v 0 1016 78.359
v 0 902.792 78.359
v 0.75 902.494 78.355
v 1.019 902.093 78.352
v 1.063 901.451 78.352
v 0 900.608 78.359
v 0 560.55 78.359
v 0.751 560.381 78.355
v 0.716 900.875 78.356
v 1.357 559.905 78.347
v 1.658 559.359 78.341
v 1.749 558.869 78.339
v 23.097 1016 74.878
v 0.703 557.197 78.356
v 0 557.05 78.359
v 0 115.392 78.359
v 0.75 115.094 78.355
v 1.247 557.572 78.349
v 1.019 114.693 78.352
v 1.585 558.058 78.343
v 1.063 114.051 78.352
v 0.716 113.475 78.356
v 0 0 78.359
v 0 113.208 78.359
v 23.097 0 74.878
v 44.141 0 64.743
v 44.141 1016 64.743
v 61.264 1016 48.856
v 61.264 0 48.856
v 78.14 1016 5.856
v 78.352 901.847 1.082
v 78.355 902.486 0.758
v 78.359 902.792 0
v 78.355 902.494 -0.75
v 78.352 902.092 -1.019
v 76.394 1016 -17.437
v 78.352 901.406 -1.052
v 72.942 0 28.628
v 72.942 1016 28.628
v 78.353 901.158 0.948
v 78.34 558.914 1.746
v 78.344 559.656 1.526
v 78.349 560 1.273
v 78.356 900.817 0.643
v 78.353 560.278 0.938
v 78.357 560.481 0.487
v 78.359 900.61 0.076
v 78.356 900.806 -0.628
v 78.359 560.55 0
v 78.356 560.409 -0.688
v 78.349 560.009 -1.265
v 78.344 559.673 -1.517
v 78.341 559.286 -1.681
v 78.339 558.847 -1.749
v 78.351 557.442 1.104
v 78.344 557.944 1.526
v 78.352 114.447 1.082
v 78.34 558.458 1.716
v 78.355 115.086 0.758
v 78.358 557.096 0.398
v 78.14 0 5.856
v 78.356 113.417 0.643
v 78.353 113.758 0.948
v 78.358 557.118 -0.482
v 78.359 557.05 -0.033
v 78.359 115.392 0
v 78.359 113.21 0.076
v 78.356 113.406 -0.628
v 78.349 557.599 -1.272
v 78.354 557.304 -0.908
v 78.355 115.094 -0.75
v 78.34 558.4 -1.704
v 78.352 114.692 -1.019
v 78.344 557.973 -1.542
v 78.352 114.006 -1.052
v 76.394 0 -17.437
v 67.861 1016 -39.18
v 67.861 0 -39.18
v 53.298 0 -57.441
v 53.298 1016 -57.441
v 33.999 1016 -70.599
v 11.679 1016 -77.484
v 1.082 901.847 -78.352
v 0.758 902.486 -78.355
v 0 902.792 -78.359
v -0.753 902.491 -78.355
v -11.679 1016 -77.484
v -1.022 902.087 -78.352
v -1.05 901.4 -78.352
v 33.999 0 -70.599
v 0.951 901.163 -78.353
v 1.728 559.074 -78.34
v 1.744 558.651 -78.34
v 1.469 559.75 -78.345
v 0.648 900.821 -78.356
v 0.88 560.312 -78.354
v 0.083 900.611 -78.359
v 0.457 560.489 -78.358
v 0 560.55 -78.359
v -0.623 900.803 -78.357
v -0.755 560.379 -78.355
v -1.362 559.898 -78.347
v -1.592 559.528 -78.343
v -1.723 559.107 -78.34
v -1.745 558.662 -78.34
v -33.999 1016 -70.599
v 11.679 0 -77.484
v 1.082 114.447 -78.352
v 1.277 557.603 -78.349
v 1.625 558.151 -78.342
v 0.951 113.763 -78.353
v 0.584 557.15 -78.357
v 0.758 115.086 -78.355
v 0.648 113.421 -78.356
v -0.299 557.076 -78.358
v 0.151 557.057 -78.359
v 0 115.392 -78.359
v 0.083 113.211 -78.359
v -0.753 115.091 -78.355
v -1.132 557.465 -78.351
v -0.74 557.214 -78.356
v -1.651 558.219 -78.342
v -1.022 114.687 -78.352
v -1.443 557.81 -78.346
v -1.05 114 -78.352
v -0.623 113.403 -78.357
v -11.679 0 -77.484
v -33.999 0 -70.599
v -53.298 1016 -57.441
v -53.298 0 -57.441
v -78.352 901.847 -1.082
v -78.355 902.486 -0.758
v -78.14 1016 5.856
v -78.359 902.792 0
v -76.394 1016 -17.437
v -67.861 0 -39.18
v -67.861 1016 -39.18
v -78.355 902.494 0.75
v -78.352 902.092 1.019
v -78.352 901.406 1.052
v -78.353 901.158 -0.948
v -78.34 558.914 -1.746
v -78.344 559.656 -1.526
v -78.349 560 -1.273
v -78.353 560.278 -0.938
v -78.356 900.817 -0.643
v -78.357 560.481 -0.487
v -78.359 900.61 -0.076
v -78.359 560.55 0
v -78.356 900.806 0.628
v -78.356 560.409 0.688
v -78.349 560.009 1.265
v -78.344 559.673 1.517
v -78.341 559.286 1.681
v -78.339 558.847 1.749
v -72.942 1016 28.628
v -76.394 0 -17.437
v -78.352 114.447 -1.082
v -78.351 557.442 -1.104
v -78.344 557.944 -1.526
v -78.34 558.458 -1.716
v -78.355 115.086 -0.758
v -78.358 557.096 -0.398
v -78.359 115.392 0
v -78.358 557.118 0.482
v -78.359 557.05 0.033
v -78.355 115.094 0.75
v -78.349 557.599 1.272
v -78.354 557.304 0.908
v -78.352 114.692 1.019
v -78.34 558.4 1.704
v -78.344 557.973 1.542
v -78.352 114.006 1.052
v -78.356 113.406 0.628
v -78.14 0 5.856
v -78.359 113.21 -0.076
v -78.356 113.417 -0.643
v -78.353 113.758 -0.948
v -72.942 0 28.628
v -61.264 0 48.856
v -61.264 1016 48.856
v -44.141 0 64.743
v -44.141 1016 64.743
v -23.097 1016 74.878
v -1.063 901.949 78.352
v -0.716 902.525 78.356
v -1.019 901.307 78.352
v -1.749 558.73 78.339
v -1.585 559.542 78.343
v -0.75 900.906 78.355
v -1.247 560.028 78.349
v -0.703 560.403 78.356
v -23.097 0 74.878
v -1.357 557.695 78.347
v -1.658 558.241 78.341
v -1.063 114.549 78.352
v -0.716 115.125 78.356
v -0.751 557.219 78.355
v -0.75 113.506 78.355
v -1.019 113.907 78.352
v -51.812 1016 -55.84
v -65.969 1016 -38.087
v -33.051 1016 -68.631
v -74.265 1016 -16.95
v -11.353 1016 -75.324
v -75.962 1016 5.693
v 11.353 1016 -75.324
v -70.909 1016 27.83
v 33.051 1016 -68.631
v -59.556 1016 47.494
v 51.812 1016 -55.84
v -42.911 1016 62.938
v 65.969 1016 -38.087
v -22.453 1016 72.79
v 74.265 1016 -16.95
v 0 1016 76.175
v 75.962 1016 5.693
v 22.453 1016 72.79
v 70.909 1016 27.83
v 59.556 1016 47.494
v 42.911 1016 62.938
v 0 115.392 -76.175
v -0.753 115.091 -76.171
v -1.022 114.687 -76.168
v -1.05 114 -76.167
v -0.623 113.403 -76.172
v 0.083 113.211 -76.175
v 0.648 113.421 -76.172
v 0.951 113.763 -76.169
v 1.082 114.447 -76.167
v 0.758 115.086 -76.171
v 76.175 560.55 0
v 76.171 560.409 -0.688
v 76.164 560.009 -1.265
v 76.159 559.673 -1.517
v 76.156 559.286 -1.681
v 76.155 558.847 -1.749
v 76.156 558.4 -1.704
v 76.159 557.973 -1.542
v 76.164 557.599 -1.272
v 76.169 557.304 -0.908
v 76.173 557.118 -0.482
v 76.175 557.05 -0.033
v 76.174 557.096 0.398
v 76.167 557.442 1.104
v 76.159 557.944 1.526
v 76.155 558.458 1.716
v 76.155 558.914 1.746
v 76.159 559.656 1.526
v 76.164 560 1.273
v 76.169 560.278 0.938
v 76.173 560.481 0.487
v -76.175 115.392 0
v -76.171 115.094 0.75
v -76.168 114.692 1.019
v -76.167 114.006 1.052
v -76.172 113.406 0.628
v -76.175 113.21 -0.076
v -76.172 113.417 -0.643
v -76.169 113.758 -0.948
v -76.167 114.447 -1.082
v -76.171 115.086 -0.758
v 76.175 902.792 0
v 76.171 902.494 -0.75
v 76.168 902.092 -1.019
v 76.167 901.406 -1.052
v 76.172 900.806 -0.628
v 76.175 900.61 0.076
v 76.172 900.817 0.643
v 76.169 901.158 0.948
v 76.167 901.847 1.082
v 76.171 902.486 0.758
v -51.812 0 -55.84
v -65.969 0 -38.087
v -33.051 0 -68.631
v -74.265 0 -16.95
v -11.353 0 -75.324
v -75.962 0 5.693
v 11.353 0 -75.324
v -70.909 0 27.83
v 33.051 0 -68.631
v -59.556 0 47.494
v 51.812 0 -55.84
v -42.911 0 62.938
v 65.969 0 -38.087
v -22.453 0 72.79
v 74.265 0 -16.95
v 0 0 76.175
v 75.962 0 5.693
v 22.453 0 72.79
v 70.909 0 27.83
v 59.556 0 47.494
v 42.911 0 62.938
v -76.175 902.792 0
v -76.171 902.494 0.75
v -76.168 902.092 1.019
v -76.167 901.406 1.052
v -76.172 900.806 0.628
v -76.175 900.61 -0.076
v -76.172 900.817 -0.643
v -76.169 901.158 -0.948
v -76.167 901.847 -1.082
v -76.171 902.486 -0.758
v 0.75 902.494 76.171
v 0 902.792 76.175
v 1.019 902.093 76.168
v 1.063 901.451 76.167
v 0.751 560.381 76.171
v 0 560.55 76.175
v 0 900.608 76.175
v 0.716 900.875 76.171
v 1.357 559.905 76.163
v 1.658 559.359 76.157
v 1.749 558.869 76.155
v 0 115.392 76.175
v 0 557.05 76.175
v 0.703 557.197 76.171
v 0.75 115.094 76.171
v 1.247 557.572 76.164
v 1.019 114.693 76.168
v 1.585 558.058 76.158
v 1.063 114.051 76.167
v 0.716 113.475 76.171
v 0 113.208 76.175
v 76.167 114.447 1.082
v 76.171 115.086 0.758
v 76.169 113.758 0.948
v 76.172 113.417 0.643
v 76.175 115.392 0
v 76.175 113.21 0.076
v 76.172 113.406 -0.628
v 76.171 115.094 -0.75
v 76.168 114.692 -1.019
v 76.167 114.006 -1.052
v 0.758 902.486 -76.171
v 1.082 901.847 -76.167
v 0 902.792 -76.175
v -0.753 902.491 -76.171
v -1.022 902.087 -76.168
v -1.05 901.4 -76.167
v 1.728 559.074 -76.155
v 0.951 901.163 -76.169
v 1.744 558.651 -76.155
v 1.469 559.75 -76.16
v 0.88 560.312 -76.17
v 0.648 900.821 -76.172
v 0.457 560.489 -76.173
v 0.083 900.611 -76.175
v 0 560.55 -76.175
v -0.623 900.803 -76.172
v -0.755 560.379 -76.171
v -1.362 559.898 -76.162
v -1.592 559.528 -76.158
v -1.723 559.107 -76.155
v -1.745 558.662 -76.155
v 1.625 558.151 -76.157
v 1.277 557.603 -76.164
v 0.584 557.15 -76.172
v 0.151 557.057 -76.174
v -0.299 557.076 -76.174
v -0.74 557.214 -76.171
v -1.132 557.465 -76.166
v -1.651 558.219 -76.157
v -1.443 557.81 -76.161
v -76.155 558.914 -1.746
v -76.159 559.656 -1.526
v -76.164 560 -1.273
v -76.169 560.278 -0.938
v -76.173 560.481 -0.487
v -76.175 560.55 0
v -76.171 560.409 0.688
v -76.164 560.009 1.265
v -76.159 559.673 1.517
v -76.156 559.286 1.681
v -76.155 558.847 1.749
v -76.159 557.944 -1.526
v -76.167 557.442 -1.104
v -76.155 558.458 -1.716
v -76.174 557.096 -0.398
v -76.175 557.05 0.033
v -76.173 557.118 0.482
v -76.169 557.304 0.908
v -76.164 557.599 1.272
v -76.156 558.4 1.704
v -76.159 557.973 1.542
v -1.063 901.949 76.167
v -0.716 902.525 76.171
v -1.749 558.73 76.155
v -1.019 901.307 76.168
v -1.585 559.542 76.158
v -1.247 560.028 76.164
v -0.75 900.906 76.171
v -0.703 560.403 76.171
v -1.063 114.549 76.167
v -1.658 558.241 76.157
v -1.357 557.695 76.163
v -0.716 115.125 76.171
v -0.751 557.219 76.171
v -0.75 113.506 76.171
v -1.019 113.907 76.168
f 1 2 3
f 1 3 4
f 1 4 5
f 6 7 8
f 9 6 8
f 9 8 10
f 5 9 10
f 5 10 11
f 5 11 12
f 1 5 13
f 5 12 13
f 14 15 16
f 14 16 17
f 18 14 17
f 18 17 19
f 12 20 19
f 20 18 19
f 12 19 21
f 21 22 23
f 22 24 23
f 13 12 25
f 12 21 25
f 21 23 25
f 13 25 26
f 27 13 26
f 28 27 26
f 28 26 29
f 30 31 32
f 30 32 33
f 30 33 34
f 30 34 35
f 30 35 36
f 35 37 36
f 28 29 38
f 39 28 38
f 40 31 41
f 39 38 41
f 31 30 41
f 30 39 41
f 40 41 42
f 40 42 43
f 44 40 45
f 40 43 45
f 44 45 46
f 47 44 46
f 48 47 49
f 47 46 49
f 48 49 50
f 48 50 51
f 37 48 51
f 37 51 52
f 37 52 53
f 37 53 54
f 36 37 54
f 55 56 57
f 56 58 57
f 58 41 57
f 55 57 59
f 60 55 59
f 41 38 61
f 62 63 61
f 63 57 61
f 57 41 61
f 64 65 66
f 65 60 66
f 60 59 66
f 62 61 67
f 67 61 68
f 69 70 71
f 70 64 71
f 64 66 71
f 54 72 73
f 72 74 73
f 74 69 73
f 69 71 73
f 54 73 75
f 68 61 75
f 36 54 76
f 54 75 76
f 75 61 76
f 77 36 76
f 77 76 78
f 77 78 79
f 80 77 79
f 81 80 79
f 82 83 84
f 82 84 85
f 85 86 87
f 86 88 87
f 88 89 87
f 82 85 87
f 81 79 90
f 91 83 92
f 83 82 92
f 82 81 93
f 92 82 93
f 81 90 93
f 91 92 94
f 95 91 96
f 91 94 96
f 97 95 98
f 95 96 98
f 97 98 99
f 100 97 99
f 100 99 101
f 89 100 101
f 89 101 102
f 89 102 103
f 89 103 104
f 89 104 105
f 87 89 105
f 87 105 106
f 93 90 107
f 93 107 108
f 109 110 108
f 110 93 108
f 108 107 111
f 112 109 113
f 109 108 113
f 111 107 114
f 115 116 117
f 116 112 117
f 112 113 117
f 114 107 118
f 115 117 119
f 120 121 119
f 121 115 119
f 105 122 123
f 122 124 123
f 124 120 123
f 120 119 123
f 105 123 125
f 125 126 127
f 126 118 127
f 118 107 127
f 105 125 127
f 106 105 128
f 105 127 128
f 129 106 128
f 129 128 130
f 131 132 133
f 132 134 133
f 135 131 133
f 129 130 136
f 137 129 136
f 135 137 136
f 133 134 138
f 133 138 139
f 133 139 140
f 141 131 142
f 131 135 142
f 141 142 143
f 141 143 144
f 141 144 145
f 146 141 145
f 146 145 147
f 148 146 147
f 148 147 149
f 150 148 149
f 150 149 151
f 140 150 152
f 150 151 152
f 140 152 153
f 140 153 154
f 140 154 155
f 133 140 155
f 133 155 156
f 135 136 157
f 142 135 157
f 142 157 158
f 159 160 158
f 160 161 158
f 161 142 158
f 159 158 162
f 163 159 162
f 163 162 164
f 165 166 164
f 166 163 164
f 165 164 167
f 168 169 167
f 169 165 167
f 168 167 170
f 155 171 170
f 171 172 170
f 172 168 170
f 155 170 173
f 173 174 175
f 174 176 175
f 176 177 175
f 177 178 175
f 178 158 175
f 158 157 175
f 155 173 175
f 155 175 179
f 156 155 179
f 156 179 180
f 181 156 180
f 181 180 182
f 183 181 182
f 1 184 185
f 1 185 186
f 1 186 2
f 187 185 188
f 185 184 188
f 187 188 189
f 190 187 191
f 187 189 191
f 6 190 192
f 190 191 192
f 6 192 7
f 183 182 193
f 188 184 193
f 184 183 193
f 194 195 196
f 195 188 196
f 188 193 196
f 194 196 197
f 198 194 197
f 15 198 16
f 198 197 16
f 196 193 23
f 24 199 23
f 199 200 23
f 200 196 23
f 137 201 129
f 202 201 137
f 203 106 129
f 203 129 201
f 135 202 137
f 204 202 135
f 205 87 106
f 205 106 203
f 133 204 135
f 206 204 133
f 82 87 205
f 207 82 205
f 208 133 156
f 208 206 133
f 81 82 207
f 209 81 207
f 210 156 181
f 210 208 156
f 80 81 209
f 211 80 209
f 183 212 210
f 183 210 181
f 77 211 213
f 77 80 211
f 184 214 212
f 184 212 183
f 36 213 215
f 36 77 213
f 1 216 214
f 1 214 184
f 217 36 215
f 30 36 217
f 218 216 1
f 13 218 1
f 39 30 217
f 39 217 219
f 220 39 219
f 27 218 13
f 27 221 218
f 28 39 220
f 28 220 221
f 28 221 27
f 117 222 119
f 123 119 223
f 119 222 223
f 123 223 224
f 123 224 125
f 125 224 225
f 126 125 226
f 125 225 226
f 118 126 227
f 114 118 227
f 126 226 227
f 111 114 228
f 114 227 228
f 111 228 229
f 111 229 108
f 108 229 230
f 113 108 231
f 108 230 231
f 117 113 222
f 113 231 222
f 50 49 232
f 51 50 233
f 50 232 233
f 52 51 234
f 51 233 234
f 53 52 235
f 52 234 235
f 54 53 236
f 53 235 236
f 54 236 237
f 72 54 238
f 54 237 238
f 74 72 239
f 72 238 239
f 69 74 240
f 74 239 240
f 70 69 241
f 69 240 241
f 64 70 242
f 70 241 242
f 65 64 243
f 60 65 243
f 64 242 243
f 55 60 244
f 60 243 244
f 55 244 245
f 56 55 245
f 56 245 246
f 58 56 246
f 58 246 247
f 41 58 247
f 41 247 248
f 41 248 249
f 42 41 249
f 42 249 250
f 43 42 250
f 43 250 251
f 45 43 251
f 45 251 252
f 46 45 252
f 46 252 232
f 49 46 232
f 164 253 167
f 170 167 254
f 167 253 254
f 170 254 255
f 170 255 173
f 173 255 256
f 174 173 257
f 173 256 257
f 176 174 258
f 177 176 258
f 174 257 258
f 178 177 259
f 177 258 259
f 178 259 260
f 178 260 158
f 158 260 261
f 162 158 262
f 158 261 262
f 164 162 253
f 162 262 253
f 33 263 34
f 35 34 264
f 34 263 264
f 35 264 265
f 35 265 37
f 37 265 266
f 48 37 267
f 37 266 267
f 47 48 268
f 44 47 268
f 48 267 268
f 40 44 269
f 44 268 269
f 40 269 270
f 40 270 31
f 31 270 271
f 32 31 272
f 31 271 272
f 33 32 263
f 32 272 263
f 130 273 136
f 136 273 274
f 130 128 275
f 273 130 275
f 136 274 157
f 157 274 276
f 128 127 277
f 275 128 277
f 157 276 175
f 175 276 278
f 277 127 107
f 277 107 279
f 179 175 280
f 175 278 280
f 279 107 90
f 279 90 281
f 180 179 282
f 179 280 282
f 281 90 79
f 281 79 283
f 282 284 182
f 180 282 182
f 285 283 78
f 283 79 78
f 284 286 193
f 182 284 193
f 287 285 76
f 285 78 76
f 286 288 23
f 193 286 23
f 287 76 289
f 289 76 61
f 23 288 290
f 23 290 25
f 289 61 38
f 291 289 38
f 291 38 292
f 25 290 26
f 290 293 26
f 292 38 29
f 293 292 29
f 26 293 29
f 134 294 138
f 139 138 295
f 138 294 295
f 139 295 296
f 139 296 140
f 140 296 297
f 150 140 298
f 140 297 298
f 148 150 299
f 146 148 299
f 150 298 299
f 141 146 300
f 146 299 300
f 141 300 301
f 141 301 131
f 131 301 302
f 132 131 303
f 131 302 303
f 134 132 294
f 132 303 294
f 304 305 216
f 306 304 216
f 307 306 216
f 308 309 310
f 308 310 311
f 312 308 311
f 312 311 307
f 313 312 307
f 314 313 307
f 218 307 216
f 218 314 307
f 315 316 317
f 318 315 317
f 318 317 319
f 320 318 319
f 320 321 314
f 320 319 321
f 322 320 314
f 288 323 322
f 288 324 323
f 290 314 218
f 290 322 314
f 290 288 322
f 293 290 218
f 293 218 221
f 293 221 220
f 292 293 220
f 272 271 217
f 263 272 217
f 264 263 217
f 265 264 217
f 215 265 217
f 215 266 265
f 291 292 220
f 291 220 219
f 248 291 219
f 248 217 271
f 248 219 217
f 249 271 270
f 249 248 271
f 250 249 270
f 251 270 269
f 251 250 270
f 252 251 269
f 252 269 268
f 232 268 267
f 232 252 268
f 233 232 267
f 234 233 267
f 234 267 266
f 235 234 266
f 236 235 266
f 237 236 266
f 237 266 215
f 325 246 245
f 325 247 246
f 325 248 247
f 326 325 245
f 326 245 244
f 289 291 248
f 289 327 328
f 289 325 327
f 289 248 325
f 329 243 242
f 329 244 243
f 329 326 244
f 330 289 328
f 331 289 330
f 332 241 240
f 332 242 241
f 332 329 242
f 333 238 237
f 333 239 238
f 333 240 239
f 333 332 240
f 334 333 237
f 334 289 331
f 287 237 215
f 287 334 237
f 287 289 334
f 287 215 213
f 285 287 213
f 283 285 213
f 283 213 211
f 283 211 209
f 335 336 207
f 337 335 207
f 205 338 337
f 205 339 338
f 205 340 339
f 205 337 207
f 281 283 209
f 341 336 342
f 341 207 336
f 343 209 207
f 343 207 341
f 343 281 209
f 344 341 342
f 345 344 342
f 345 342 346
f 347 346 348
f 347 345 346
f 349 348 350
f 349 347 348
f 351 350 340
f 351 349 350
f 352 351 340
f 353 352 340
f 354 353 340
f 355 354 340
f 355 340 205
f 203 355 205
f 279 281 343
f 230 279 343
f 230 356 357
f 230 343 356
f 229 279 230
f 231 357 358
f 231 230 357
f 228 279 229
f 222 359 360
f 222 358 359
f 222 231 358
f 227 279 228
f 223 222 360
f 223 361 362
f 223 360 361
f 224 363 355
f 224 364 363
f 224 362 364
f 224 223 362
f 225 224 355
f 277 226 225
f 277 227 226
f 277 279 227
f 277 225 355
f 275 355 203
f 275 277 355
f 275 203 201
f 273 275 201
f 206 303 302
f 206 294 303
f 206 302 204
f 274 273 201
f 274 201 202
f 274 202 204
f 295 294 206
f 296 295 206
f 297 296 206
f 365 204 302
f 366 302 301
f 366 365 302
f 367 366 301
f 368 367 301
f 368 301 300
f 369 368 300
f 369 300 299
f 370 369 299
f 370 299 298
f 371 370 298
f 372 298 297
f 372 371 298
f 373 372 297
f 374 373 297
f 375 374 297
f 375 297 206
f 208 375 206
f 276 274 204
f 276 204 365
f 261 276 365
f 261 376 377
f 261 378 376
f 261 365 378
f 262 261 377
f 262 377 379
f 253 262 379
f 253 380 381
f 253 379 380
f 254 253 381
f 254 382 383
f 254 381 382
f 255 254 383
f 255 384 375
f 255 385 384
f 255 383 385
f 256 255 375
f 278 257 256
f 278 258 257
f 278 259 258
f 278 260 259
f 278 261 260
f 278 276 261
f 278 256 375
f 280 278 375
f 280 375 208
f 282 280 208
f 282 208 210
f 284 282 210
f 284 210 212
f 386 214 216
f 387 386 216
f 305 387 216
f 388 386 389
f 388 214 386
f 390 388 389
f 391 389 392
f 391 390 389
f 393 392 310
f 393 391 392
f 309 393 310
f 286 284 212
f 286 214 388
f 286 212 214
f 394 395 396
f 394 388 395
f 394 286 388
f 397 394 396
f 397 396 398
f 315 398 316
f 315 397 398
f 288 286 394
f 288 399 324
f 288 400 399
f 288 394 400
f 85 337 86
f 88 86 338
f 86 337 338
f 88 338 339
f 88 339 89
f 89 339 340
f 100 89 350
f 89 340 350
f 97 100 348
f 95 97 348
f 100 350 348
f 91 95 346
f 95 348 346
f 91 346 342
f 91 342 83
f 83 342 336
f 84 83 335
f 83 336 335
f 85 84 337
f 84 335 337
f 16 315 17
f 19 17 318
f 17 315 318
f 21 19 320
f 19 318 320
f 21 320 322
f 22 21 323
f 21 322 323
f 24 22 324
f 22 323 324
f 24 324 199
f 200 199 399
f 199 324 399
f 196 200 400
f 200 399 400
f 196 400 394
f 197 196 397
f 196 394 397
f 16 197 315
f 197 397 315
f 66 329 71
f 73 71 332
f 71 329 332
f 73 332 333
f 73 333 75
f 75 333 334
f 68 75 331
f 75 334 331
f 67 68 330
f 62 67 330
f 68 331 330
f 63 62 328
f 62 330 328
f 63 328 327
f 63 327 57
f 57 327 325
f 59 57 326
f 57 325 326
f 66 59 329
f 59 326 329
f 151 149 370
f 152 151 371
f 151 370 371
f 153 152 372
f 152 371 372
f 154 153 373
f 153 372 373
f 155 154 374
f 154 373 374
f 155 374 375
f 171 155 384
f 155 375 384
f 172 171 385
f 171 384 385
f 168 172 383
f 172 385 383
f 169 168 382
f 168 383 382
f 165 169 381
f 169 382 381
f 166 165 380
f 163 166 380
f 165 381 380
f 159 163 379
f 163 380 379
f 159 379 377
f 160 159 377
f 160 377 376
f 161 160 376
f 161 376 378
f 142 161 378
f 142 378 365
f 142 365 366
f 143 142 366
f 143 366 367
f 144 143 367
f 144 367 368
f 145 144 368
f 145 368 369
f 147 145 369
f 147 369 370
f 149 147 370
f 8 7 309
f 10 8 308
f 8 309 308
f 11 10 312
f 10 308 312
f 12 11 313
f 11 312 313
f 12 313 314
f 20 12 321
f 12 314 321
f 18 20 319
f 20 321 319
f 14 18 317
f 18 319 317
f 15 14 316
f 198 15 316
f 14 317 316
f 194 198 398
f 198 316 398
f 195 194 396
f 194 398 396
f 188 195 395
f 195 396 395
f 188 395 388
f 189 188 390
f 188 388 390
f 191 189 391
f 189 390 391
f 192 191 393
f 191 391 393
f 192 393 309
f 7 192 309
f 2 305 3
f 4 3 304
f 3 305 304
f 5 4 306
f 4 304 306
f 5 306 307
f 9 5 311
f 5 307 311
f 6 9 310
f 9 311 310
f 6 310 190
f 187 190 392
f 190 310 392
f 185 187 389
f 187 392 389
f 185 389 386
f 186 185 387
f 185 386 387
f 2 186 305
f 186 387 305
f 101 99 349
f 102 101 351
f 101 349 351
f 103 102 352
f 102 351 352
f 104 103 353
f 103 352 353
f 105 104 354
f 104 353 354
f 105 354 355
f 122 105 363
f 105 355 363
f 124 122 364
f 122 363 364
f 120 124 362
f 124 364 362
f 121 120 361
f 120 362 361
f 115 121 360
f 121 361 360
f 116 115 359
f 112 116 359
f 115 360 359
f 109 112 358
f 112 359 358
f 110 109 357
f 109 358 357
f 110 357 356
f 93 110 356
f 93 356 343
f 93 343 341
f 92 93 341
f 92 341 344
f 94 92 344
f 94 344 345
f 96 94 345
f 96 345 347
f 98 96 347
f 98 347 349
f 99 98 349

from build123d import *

# Parameters (mm, degrees)
SKETCH1_R           = 78.359
SKETCH1_R_2         = 76.1746
BOSS_EXTRUDE1_DEPTH = 1016
SKETCH3_R           = 1.750000056
SKETCH3_R_2         = 1.0922
CUT_EXTRUDE1_DEPTH  = 1023.025570014
CIRPATTERN1_COUNT   = 4


with BuildPart() as part:
    # Sketch1 → Boss-Extrude1 (new body)
    with BuildSketch(Plane(origin=(0, 0, 0), x_dir=(1, 0, 0), z_dir=(0, 1, 0))):
        with Locations(Location((0, 0, 0), (0, 0, 270))):
            Circle(SKETCH1_R)
        with Locations(Location((0, 0, 0), (0, 0, 270))):
            Circle(SKETCH1_R_2, mode=Mode.SUBTRACT)
    extrude(amount=BOSS_EXTRUDE1_DEPTH)

    # Sketch3 → Cut-Extrude1 (cut, through all)
    with BuildSketch(Plane.XY):
        with Locations(Location((0, 558.8, 0), (0, 0, 90))):
            Circle(SKETCH3_R)
        with Locations(Location((0, 114.3, 0), (0, 0, 90))):
            Circle(SKETCH3_R_2)
        with Locations(Location((0, 901.7, 0), (0, 0, 90))):
            Circle(SKETCH3_R_2)
    cut_extrude1 = extrude(amount=-CUT_EXTRUDE1_DEPTH, mode=Mode.SUBTRACT)

    # CirPattern1: Cut-Extrude1 ×4 about axis
    cirpattern1_axis = Axis((0, 1016, 0), (0, -1, 0))
    for i in range(1, CIRPATTERN1_COUNT):
        add(cut_extrude1.rotate(cirpattern1_axis, i * 360 / CIRPATTERN1_COUNT), mode=Mode.SUBTRACT)


solid = part.part
